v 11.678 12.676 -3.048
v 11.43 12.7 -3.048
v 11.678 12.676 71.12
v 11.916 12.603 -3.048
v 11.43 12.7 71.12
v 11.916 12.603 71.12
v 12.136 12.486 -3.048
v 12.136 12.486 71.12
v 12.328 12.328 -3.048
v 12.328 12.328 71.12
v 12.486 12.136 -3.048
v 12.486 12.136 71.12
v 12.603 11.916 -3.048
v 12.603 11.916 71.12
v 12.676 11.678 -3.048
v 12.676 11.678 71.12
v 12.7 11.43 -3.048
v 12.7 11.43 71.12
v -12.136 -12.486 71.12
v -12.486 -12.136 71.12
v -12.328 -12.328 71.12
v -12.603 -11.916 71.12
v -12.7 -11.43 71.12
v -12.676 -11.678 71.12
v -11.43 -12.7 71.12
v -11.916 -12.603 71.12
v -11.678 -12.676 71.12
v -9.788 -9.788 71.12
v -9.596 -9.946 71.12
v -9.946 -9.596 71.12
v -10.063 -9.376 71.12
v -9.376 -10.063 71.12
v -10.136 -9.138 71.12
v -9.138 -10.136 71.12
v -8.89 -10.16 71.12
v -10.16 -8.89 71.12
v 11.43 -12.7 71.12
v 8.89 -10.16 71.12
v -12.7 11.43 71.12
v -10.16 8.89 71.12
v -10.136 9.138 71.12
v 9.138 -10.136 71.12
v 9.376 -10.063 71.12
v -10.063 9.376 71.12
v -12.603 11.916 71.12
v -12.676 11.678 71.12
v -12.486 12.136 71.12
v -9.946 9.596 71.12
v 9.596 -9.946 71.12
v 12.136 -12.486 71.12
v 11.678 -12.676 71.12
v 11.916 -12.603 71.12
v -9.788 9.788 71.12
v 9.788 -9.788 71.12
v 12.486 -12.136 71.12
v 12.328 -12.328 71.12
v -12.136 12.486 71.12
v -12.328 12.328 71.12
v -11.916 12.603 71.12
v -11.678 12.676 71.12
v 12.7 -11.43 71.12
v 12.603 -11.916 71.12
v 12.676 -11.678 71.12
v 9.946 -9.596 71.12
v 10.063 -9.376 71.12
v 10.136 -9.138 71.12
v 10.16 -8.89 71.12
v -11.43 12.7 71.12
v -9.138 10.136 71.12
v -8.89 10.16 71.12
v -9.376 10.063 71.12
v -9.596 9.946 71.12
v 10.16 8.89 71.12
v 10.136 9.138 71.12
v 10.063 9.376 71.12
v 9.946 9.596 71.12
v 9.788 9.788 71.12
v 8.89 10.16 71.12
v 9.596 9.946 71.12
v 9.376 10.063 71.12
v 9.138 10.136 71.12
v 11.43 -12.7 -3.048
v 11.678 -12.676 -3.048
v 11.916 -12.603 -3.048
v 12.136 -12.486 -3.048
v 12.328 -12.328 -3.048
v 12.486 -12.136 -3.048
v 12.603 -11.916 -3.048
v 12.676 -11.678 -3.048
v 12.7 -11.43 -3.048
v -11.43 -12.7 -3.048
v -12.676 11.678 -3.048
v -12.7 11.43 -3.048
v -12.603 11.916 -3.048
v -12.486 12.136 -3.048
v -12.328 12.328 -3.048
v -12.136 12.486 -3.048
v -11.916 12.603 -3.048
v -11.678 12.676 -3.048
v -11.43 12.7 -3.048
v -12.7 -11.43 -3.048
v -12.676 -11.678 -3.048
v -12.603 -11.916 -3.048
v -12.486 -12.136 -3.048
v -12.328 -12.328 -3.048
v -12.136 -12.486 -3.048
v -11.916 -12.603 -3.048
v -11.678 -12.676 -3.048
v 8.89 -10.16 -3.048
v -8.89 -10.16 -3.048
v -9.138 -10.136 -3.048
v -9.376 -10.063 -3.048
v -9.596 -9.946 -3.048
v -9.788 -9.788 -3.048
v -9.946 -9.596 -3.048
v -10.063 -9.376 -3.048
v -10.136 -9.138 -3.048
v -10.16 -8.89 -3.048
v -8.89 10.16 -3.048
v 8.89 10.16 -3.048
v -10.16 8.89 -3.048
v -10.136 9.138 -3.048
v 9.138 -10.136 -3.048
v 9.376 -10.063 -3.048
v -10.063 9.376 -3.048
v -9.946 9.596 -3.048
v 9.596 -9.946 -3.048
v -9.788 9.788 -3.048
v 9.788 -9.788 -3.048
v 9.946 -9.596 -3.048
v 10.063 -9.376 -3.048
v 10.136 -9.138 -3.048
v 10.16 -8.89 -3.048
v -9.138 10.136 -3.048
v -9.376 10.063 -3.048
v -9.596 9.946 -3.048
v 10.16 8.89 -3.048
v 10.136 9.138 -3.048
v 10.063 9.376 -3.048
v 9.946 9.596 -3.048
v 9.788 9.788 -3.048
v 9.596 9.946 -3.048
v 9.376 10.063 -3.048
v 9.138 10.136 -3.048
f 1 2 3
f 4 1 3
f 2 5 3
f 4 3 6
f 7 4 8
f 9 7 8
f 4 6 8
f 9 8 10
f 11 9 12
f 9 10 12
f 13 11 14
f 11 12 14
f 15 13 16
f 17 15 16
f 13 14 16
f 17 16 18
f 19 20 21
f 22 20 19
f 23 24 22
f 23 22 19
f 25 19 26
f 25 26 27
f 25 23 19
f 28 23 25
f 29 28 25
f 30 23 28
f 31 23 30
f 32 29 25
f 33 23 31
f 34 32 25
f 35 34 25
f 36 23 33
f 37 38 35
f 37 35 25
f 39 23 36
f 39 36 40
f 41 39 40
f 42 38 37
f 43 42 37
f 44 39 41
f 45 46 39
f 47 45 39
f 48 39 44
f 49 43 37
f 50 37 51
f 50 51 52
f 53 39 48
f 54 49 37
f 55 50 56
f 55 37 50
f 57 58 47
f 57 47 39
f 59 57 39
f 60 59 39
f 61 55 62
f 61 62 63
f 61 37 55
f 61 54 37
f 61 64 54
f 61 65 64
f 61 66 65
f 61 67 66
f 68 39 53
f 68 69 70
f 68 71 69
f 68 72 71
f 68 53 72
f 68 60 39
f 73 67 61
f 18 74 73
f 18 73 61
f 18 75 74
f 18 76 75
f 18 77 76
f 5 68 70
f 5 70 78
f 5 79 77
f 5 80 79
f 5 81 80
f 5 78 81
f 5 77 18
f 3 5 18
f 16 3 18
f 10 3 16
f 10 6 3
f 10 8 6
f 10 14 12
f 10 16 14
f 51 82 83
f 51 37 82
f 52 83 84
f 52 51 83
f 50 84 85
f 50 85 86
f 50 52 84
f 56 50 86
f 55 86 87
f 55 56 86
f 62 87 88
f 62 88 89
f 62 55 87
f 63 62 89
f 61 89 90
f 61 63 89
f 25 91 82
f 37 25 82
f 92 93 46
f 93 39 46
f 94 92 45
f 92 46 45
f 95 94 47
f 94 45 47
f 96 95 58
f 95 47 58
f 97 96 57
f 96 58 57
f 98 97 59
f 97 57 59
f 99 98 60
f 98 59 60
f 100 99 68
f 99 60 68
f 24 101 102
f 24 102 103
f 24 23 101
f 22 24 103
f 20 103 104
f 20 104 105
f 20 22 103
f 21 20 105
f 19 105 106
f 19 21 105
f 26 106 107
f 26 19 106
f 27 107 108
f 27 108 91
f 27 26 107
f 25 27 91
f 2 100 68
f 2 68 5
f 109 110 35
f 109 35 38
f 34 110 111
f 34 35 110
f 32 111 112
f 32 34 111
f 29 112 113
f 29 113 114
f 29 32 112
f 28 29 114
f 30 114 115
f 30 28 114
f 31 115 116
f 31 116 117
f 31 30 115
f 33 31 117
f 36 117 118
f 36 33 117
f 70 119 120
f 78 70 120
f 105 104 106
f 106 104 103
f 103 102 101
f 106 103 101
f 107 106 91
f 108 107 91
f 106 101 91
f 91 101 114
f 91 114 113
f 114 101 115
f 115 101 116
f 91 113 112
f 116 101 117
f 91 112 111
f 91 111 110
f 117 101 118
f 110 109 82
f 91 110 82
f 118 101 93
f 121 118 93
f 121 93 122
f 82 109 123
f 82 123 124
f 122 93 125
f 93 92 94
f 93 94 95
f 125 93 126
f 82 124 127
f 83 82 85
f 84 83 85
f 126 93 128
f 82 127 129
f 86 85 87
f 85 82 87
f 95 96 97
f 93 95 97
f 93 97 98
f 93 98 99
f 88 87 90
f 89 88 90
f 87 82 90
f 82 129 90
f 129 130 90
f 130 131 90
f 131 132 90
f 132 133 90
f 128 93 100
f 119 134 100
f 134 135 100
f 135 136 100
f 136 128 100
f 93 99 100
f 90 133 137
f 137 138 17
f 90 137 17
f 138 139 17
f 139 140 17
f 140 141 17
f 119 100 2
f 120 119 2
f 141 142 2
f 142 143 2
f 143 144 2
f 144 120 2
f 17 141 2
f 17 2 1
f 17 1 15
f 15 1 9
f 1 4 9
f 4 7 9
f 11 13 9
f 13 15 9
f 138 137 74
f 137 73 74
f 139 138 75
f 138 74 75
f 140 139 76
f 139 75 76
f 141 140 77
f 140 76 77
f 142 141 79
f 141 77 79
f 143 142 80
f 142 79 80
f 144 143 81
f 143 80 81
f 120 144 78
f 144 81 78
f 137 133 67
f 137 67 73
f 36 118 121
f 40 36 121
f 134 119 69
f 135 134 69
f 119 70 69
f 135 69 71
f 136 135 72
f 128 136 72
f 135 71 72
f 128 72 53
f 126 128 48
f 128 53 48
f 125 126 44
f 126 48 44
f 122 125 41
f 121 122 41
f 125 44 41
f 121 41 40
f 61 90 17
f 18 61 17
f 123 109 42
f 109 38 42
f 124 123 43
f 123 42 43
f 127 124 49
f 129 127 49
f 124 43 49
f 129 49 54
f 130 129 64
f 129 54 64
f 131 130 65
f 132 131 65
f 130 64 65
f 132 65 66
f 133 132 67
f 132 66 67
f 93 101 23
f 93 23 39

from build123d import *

# Parameters (mm, degrees)
SKETCH1_W           = 25.4
SKETCH1_H           = 25.4
SKETCH1_W_2         = 20.32
SKETCH1_H_2         = 20.32
BOSS_EXTRUDE2_DEPTH = 74.168
FILLET1_R           = 1.27


with BuildPart() as part:
    # Sketch1 → Boss-Extrude2 (new body)
    with BuildSketch(Plane.XY.offset(-3.048)):
        Rectangle(SKETCH1_W, SKETCH1_H)
        Rectangle(SKETCH1_W_2, SKETCH1_H_2, mode=Mode.SUBTRACT)
    extrude(amount=BOSS_EXTRUDE2_DEPTH)

    # Fillet1
    fillet1_edges = [part.edges().sort_by_distance(p)[0] for p in [
        (-12.7, 12.7, 34.036),
        (-12.7, -12.7, 34.036),
        (12.7, -12.7, 34.036),
        (12.7, 12.7, 34.036),
        (-10.16, -10.16, 34.036),
        (10.16, -10.16, 34.036),
        (10.16, 10.16, 34.036),
        (-10.16, 10.16, 34.036),
    ]]
    fillet(fillet1_edges, radius=FILLET1_R)


solid = part.part
